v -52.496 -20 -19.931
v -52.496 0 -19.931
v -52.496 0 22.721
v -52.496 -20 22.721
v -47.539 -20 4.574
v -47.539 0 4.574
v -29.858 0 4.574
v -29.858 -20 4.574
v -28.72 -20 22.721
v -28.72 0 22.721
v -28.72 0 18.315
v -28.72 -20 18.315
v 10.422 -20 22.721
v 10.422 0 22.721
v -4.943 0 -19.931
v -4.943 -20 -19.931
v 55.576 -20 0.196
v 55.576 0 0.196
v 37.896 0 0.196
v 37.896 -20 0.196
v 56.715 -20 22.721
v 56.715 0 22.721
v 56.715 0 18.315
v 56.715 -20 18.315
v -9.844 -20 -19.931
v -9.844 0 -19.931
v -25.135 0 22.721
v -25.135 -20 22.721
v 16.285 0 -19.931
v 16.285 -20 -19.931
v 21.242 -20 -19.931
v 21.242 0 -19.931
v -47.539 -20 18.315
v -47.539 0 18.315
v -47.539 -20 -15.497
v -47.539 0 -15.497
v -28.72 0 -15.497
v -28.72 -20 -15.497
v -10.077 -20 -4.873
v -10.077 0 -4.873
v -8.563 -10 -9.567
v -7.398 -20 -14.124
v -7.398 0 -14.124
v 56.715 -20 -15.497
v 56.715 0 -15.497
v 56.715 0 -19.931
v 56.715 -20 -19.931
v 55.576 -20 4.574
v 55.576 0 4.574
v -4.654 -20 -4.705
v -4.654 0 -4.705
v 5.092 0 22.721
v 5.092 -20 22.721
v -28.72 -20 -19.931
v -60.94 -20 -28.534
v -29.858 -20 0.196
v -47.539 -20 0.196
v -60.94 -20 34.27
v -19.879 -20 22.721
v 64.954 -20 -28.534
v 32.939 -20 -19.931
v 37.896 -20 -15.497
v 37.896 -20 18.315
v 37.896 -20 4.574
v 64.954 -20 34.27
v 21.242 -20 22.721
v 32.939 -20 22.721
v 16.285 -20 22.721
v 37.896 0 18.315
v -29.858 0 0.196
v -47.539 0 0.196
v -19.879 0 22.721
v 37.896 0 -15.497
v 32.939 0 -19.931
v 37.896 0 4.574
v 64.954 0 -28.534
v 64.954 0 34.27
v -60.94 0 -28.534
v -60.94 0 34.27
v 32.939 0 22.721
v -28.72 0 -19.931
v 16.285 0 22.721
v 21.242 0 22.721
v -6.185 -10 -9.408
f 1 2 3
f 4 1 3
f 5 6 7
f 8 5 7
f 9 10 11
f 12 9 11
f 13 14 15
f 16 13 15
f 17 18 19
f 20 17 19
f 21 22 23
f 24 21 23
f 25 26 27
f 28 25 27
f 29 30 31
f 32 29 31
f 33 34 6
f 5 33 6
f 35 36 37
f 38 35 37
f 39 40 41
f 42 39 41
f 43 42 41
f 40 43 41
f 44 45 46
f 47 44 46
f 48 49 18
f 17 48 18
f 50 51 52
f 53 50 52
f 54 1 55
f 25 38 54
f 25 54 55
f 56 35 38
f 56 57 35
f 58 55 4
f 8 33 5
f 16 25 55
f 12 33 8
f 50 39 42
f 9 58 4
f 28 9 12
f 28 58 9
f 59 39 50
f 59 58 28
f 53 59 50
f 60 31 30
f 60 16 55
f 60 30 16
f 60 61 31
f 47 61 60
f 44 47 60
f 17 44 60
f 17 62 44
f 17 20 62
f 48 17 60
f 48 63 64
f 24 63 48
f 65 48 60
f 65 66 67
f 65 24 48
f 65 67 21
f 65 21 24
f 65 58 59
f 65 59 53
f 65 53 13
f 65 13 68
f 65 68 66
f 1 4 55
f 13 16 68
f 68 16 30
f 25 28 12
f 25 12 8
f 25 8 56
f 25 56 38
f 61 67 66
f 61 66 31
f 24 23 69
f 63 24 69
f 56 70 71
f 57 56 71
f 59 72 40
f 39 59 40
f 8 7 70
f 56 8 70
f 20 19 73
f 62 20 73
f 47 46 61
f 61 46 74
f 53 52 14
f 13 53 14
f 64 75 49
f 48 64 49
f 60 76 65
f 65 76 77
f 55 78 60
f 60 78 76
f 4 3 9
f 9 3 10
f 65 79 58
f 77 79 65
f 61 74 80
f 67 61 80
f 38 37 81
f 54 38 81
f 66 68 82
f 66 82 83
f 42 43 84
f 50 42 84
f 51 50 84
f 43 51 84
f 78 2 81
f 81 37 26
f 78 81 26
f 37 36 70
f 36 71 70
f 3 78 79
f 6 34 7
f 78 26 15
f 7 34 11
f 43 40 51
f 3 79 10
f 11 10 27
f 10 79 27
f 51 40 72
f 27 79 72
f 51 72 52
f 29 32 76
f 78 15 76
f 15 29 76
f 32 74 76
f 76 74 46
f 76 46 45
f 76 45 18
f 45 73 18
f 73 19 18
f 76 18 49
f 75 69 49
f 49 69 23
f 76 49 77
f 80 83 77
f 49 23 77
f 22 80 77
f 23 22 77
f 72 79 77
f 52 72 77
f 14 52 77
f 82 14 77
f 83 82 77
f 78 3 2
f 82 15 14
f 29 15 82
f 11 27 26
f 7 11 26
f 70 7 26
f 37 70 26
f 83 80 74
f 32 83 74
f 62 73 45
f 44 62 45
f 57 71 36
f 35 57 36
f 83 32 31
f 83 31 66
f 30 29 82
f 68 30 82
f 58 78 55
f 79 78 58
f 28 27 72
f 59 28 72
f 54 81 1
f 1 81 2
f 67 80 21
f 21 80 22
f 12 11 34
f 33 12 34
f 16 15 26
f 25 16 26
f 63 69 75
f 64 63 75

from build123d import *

# Parameters (mm, degrees)
F0_W     = 125.8938722312
F0_H     = 62.8035478294
F0_W_2   = 4.9569368675
F0_H_2   = 42.6520612952
F1_DEPTH = 20


with BuildPart() as f1:
    # F0 (on Front) → F1 (new body)
    with BuildSketch(Plane.XZ):
        with Locations((2.0074192435, 2.8677415103)):
            Rectangle(F0_W, F0_H)
        Polygon((-28.719614941, -15.4966360104), (-28.719614941, -19.9308074079), (-52.4961087293, -19.9308074079), (-52.4961087293, 22.7212538872), (-28.719614941, 22.7212538872), (-28.719614941, 18.3150877828), (-47.5391718618, 18.3150877828), (-47.5391718618, 4.5738239993), (-29.8584968578, 4.5738239993), (-29.8584968578, 0.1956631879), (-47.5391718618, 0.1956631879), (-47.5391718618, -15.4966360104), align=None, mode=Mode.SUBTRACT)
        with BuildLine():
            Line((-4.6537331246, -4.7052630936), (5.0921088522, 22.7212538872))
            Line((5.0921088522, 22.7212538872), (10.4224496269, 22.7212538872))
            Line((10.4224496269, 22.7212538872), (-4.9431211527, -19.9308074079))
            Line((-4.9431211527, -19.9308074079), (-9.8440474341, -19.9308074079))
            Line((-9.8440474341, -19.9308074079), (-25.1349374323, 22.7212538872))
            Line((-25.1349374323, 22.7212538872), (-19.879277439, 22.7212538872))
            Line((-19.879277439, 22.7212538872), (-10.0774248761, -4.8732948518))
            add(Edge.make_bspline(
                [(-10.0774248761, -4.8732948518), (-8.3877721962, -9.634194668), (-7.3982518423, -14.1243766516)],
                knots=[0, 0, 0, 1, 1, 1], degree=2))
            add(Edge.make_bspline(
                [(-7.3982518423, -14.1243766516), (-6.3433858045, -9.4008172261), (-4.6537331246, -4.7052630936)],
                knots=[0, 0, 0, 1, 1, 1], degree=2))
        make_face(mode=Mode.SUBTRACT)
        with Locations((18.763359403, 1.3952232396)):
            Rectangle(F0_W_2, F0_H_2, mode=Mode.SUBTRACT)
        Polygon((56.7151990169, -15.4966360104), (56.7151990169, -19.9308074079), (32.9387052285, -19.9308074079), (32.9387052285, 22.7212538872), (56.7151990169, 22.7212538872), (56.7151990169, 18.3150877828), (37.8956420961, 18.3150877828), (37.8956420961, 4.5738239993), (55.5763171, 4.5738239993), (55.5763171, 0.1956631879), (37.8956420961, 0.1956631879), (37.8956420961, -15.4966360104), align=None, mode=Mode.SUBTRACT)
    extrude(amount=F1_DEPTH)


solid = f1.part
